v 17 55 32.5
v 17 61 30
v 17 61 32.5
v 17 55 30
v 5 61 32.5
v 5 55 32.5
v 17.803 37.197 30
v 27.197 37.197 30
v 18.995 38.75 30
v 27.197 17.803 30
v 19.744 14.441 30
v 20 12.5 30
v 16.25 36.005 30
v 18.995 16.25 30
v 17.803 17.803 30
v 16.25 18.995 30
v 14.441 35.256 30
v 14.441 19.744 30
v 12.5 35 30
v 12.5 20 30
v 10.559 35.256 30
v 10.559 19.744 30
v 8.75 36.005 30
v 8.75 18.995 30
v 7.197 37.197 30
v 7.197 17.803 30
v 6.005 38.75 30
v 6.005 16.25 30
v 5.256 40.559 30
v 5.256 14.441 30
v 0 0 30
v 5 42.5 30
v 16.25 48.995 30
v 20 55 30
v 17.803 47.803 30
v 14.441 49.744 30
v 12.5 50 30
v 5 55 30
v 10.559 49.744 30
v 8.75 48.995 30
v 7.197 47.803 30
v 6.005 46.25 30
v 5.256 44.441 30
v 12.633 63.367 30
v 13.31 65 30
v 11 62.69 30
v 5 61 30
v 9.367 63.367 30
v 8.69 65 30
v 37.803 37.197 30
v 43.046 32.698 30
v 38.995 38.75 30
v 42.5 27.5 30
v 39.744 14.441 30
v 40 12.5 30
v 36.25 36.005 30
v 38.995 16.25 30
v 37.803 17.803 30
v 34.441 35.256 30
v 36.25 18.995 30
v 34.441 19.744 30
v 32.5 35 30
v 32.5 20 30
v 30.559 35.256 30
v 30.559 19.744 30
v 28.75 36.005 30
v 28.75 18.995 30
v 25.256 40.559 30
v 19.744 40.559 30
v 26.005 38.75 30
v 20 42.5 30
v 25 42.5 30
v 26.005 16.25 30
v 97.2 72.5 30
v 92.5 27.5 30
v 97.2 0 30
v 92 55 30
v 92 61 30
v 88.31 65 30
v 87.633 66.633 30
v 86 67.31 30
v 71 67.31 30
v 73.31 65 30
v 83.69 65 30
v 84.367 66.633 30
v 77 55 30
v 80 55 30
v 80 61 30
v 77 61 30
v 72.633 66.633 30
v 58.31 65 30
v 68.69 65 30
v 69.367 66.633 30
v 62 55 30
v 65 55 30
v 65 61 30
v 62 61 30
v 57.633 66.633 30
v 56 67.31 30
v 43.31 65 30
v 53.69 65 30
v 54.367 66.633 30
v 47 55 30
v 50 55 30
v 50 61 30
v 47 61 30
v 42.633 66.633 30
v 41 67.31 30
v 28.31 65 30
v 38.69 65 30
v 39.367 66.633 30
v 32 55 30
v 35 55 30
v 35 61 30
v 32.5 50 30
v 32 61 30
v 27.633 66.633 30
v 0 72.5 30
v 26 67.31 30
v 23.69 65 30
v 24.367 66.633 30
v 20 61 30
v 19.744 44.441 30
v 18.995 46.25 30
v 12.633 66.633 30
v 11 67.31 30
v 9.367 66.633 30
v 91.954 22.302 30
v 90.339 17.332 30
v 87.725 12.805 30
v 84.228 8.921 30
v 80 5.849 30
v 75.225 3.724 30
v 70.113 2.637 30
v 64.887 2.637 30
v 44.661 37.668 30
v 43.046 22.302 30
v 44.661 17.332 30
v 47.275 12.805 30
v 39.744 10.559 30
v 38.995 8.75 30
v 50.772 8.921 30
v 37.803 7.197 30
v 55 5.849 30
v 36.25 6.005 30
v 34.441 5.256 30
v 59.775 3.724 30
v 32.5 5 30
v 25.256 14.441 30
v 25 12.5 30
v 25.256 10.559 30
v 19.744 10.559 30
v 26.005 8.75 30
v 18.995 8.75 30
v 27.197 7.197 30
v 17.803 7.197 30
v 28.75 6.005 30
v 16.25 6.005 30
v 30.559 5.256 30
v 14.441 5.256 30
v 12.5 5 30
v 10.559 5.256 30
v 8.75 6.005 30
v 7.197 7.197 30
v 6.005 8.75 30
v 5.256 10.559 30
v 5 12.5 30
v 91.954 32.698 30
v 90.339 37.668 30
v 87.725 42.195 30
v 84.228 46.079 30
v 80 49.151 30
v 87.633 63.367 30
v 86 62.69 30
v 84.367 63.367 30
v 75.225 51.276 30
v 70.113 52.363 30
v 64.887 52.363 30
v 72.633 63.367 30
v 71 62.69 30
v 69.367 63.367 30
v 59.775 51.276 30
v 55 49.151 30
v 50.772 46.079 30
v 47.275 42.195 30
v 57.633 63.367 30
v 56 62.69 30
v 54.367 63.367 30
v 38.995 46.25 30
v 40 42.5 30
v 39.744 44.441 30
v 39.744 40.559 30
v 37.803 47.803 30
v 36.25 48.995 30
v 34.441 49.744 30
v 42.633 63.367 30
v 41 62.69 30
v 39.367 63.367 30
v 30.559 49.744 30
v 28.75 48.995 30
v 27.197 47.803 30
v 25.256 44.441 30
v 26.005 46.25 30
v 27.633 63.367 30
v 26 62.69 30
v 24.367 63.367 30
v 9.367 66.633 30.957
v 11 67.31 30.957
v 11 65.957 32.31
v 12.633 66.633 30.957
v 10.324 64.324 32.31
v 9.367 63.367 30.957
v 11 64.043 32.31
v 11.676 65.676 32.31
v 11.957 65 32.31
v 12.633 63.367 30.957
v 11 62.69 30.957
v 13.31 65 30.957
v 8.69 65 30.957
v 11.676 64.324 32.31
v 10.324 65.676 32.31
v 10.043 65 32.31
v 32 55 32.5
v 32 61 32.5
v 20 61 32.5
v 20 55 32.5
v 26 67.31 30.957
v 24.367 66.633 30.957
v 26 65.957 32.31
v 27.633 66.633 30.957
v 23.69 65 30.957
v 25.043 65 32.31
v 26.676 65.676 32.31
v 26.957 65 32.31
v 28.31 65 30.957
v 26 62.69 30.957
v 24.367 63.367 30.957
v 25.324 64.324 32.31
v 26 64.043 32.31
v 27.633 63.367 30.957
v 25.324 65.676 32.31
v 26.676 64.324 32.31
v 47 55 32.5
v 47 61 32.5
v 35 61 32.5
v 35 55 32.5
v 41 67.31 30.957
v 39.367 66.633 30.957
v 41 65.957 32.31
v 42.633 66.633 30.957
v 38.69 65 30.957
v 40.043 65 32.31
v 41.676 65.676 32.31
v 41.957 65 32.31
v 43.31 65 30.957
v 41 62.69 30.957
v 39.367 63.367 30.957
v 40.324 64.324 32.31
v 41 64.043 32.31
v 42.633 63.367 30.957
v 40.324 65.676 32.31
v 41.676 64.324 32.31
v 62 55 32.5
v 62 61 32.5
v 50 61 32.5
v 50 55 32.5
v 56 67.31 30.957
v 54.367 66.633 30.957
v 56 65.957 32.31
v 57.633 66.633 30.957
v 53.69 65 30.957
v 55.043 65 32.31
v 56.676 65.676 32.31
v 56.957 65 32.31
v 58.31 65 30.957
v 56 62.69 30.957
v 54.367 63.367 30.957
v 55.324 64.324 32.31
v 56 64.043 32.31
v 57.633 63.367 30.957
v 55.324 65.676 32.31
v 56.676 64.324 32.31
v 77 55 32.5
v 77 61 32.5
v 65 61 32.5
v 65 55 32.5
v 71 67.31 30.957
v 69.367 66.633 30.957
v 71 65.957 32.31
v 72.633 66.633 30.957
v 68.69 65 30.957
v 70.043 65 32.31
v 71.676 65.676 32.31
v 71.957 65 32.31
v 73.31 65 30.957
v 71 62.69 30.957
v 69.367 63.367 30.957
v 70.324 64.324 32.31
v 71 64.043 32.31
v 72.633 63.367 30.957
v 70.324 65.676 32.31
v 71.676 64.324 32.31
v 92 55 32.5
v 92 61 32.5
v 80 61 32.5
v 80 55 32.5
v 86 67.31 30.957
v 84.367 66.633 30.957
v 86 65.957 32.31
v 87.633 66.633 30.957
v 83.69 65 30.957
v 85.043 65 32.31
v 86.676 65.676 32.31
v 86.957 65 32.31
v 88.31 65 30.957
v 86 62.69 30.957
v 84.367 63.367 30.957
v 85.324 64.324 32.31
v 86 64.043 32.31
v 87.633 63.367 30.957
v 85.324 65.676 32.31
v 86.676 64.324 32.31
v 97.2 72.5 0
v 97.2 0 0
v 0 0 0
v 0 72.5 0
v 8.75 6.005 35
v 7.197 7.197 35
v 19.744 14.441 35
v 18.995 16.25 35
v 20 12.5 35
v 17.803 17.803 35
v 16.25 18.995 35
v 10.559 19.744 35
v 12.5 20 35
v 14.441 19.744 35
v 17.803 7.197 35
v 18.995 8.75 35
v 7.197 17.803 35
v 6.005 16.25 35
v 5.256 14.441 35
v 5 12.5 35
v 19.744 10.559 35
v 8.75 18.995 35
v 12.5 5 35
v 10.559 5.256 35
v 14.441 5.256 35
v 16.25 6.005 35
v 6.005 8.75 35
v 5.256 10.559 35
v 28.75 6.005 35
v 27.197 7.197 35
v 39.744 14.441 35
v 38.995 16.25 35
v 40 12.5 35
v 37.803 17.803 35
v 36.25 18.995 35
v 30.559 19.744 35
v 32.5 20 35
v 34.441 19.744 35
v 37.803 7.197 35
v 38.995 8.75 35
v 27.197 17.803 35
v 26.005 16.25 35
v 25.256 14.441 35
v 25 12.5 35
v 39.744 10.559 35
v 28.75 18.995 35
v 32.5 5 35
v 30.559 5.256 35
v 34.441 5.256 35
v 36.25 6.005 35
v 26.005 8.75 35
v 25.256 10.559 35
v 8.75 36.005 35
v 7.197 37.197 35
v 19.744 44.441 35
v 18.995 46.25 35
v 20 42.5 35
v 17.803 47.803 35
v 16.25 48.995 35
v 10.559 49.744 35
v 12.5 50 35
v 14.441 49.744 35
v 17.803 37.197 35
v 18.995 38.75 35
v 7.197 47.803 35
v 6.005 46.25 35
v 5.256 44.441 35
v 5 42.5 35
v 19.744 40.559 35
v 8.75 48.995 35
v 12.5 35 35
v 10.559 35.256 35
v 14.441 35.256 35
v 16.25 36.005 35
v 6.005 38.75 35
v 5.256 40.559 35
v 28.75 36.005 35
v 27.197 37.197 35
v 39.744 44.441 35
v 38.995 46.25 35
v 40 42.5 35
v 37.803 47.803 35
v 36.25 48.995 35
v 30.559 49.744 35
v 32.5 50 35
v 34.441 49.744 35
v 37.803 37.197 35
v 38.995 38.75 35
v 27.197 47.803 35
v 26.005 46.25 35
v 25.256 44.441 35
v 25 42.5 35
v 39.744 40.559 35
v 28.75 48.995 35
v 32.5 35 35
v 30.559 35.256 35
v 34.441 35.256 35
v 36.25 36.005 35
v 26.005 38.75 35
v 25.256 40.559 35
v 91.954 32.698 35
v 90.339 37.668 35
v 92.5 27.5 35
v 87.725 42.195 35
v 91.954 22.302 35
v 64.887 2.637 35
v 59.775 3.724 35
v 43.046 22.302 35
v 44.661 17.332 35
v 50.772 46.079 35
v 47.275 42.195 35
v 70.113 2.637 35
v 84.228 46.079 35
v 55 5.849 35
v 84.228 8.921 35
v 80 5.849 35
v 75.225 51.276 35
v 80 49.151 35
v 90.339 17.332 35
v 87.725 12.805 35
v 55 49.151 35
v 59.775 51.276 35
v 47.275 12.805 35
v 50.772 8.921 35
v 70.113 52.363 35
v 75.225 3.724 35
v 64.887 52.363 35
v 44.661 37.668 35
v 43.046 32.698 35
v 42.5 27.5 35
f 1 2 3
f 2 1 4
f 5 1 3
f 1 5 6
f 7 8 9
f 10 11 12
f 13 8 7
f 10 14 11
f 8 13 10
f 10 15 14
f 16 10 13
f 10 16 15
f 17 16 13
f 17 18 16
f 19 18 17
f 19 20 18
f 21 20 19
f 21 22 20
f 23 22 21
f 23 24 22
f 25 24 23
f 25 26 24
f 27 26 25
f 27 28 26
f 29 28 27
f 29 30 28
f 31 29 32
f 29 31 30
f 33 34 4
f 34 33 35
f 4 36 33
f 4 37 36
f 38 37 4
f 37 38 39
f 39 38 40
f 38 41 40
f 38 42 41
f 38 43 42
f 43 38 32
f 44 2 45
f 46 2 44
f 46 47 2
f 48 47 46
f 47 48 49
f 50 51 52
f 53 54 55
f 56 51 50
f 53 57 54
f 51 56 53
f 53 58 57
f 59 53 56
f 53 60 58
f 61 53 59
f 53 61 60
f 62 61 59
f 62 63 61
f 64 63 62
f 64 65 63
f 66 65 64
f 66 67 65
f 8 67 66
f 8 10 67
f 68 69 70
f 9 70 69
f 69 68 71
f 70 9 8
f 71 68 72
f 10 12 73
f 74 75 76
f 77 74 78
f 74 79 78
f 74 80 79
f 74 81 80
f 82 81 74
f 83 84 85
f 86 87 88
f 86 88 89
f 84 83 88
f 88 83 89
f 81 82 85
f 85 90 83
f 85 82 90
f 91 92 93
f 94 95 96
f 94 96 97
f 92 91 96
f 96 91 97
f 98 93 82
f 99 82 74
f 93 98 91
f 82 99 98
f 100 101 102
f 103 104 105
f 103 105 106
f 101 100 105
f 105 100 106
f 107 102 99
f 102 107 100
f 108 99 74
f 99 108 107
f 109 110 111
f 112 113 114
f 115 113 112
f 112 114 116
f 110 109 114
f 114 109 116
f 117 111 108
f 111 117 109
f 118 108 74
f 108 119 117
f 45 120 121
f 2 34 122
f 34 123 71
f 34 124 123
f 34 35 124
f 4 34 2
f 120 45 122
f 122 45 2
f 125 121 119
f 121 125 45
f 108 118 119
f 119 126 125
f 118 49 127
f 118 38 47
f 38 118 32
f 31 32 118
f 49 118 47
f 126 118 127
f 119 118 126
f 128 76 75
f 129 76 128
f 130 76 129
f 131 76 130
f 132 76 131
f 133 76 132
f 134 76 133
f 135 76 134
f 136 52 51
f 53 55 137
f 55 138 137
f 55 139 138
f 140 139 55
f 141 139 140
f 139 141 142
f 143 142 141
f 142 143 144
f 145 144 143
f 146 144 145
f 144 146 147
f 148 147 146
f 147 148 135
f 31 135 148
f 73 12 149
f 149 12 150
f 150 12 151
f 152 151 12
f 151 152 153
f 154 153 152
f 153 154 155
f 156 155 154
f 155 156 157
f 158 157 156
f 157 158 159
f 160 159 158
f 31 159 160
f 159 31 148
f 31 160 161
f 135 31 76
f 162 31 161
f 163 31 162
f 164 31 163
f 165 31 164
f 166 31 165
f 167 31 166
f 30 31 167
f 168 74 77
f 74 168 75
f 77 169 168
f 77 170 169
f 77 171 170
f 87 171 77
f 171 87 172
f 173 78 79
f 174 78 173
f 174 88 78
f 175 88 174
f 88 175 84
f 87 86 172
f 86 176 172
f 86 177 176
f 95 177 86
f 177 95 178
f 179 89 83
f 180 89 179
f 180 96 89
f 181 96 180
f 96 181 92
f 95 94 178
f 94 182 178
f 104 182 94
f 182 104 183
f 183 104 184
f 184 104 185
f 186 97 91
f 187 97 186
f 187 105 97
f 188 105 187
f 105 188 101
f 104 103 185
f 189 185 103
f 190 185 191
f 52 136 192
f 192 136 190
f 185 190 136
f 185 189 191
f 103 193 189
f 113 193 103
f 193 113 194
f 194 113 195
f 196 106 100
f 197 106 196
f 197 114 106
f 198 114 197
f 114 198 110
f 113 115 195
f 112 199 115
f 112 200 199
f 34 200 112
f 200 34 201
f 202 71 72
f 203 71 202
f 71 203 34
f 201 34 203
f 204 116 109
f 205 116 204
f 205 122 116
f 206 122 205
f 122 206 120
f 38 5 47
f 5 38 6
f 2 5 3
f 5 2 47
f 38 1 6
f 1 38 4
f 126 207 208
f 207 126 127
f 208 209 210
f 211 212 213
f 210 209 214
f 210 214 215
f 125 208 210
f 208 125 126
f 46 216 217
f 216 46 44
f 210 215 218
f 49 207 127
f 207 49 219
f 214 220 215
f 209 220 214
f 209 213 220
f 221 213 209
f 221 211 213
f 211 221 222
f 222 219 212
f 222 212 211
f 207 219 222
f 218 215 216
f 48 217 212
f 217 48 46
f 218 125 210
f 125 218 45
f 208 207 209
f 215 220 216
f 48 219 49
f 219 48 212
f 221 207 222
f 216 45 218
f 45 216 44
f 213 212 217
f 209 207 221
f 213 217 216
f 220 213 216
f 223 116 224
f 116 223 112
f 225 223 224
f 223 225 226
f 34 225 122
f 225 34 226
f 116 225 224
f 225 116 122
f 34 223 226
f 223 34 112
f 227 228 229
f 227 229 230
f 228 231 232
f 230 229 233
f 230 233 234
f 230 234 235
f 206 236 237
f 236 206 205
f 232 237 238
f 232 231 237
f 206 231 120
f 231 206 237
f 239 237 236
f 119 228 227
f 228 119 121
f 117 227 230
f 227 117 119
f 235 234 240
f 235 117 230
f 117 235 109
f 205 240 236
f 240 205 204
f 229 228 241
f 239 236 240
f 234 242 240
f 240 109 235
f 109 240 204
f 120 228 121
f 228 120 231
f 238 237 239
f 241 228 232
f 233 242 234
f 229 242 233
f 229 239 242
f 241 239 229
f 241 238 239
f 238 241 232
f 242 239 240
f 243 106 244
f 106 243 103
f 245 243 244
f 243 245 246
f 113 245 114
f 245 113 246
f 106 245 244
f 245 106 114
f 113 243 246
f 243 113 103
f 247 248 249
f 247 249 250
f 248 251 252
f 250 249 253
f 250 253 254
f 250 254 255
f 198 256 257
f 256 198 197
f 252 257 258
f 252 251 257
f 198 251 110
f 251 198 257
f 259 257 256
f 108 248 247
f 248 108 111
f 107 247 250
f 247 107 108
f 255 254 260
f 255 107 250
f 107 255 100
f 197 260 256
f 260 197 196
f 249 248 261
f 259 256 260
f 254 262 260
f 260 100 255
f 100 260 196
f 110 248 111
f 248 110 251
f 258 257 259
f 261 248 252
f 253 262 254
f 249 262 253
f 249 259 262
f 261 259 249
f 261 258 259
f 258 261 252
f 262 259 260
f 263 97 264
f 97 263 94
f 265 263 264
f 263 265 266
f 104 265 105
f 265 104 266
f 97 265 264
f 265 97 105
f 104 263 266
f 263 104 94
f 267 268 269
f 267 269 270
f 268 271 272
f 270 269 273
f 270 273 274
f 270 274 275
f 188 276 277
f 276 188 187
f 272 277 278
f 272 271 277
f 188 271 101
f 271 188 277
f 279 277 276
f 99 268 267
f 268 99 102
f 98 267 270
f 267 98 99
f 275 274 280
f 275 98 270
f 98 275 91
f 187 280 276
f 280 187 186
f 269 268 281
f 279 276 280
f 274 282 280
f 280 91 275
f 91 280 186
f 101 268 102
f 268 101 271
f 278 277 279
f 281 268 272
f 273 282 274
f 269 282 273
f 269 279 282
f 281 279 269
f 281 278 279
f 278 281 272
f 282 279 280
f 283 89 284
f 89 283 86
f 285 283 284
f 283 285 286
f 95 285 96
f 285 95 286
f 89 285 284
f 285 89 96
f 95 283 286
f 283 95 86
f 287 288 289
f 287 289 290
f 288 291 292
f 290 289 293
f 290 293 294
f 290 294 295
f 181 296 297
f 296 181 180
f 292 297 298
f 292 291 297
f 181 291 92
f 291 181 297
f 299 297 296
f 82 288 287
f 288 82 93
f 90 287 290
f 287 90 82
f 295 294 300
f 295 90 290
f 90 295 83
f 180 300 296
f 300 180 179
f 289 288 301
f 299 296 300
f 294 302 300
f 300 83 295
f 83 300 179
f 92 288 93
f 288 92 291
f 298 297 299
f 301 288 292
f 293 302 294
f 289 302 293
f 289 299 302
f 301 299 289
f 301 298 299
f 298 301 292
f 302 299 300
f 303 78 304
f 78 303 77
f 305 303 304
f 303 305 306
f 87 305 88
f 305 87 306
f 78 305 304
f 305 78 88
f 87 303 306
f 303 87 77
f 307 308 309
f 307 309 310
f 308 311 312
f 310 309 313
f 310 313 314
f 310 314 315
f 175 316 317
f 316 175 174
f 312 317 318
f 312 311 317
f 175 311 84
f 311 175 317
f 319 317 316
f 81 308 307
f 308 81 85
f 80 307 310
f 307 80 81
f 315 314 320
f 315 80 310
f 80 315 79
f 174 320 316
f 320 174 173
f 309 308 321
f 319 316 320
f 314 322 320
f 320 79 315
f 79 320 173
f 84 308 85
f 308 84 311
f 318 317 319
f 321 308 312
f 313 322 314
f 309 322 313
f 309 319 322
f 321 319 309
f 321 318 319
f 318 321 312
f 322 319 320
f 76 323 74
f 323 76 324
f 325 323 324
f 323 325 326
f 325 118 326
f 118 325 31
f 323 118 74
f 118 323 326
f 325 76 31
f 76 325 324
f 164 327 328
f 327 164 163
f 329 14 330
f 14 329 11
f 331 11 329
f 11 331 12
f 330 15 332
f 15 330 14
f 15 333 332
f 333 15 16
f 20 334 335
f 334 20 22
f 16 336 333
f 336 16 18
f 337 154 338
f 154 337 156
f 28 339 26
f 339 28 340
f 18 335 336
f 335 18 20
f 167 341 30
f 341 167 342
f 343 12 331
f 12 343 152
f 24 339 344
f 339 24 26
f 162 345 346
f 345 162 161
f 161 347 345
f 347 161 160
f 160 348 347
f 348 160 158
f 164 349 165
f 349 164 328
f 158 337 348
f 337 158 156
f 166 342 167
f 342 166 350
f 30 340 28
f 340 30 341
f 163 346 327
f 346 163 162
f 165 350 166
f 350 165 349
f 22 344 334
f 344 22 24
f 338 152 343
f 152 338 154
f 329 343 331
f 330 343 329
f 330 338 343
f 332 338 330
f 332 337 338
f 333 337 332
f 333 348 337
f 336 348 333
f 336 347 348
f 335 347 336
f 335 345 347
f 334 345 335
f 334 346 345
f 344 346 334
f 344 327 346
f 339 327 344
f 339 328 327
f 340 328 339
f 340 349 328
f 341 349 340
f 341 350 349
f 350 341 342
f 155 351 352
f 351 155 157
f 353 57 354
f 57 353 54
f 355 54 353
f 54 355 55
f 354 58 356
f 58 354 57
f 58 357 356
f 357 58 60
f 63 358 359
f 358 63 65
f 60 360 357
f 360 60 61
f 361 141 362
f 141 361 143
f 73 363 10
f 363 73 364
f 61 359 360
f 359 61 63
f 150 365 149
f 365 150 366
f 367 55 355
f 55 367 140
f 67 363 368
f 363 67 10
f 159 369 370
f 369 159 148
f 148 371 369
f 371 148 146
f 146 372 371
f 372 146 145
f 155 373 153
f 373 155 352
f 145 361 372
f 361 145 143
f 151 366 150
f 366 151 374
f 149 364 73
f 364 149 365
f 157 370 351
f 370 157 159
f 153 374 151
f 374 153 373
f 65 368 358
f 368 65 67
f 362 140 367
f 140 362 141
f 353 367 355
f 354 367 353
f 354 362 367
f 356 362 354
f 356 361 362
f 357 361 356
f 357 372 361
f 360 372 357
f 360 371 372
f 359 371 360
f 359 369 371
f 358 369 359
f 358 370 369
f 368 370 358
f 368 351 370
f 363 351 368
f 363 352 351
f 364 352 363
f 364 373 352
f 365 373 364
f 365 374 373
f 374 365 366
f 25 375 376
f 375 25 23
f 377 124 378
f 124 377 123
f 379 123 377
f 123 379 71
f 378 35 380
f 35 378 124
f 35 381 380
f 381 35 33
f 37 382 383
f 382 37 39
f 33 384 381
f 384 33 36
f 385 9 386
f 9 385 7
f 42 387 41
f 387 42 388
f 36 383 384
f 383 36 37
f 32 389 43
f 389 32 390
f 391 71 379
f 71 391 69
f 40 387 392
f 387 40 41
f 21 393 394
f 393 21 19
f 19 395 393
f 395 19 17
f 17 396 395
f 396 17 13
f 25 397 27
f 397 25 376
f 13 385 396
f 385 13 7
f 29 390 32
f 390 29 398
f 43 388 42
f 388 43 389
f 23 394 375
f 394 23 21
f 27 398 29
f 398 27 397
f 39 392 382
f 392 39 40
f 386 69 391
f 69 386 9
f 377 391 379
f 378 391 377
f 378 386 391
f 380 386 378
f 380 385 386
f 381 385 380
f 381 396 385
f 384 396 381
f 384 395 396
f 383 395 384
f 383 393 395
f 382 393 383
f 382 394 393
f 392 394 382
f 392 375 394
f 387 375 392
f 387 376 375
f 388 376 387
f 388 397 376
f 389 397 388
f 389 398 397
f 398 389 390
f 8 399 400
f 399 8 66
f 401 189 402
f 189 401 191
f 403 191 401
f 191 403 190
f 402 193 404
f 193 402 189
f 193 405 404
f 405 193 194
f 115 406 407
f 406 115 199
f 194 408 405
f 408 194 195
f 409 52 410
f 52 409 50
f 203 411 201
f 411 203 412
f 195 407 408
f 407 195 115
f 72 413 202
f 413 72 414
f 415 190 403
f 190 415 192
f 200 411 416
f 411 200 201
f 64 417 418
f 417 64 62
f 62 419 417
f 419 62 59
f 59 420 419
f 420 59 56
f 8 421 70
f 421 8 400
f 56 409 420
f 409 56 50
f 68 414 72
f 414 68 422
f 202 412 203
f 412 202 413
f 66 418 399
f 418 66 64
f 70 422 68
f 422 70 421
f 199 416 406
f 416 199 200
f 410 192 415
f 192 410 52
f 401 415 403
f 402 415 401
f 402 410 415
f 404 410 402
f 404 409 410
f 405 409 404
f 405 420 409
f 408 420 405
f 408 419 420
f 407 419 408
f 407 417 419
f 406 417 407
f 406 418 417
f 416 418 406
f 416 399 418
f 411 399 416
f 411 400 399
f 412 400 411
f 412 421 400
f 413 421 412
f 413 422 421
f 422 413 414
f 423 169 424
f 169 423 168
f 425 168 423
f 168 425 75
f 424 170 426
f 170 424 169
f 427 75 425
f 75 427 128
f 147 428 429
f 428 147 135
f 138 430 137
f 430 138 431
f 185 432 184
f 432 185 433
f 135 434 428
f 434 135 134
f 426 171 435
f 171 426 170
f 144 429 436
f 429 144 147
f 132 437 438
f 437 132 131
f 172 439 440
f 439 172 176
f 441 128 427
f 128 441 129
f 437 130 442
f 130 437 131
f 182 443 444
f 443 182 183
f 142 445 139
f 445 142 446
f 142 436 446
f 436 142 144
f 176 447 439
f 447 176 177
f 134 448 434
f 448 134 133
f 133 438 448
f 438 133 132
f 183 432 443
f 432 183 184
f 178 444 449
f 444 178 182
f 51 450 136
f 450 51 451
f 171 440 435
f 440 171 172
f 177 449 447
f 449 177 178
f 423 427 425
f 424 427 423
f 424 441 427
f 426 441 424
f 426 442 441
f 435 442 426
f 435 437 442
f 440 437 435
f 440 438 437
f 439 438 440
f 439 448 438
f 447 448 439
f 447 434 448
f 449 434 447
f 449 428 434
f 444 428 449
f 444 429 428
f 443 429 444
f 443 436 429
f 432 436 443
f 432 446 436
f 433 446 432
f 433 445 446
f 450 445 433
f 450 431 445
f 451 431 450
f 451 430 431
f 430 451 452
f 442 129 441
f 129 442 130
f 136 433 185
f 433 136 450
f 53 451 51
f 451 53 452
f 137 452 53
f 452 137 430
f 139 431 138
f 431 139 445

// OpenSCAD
L = 97.2;
H = 30;
P = 72.5;

color("green") cube([L, P, H]);
translate([12.5, 12.5, H]) cylinder(h=5, d=15);
translate([32.5, 12.5, H]) cylinder(h=5, d=15);
translate([12.5, 42.5, H]) cylinder(h=5, d=15);
translate([32.5, 42.5, H]) cylinder(h=5, d=15);
translate([67.5, 27.5, H]) cylinder(h=5, d=50);

for (i = [0:5])
{
    translate([5+15*i, 55, H]) cube([12, 6, 2.5]);
    color("red") translate([11+15*i, 55+10, H]) sphere(d=5);
}
